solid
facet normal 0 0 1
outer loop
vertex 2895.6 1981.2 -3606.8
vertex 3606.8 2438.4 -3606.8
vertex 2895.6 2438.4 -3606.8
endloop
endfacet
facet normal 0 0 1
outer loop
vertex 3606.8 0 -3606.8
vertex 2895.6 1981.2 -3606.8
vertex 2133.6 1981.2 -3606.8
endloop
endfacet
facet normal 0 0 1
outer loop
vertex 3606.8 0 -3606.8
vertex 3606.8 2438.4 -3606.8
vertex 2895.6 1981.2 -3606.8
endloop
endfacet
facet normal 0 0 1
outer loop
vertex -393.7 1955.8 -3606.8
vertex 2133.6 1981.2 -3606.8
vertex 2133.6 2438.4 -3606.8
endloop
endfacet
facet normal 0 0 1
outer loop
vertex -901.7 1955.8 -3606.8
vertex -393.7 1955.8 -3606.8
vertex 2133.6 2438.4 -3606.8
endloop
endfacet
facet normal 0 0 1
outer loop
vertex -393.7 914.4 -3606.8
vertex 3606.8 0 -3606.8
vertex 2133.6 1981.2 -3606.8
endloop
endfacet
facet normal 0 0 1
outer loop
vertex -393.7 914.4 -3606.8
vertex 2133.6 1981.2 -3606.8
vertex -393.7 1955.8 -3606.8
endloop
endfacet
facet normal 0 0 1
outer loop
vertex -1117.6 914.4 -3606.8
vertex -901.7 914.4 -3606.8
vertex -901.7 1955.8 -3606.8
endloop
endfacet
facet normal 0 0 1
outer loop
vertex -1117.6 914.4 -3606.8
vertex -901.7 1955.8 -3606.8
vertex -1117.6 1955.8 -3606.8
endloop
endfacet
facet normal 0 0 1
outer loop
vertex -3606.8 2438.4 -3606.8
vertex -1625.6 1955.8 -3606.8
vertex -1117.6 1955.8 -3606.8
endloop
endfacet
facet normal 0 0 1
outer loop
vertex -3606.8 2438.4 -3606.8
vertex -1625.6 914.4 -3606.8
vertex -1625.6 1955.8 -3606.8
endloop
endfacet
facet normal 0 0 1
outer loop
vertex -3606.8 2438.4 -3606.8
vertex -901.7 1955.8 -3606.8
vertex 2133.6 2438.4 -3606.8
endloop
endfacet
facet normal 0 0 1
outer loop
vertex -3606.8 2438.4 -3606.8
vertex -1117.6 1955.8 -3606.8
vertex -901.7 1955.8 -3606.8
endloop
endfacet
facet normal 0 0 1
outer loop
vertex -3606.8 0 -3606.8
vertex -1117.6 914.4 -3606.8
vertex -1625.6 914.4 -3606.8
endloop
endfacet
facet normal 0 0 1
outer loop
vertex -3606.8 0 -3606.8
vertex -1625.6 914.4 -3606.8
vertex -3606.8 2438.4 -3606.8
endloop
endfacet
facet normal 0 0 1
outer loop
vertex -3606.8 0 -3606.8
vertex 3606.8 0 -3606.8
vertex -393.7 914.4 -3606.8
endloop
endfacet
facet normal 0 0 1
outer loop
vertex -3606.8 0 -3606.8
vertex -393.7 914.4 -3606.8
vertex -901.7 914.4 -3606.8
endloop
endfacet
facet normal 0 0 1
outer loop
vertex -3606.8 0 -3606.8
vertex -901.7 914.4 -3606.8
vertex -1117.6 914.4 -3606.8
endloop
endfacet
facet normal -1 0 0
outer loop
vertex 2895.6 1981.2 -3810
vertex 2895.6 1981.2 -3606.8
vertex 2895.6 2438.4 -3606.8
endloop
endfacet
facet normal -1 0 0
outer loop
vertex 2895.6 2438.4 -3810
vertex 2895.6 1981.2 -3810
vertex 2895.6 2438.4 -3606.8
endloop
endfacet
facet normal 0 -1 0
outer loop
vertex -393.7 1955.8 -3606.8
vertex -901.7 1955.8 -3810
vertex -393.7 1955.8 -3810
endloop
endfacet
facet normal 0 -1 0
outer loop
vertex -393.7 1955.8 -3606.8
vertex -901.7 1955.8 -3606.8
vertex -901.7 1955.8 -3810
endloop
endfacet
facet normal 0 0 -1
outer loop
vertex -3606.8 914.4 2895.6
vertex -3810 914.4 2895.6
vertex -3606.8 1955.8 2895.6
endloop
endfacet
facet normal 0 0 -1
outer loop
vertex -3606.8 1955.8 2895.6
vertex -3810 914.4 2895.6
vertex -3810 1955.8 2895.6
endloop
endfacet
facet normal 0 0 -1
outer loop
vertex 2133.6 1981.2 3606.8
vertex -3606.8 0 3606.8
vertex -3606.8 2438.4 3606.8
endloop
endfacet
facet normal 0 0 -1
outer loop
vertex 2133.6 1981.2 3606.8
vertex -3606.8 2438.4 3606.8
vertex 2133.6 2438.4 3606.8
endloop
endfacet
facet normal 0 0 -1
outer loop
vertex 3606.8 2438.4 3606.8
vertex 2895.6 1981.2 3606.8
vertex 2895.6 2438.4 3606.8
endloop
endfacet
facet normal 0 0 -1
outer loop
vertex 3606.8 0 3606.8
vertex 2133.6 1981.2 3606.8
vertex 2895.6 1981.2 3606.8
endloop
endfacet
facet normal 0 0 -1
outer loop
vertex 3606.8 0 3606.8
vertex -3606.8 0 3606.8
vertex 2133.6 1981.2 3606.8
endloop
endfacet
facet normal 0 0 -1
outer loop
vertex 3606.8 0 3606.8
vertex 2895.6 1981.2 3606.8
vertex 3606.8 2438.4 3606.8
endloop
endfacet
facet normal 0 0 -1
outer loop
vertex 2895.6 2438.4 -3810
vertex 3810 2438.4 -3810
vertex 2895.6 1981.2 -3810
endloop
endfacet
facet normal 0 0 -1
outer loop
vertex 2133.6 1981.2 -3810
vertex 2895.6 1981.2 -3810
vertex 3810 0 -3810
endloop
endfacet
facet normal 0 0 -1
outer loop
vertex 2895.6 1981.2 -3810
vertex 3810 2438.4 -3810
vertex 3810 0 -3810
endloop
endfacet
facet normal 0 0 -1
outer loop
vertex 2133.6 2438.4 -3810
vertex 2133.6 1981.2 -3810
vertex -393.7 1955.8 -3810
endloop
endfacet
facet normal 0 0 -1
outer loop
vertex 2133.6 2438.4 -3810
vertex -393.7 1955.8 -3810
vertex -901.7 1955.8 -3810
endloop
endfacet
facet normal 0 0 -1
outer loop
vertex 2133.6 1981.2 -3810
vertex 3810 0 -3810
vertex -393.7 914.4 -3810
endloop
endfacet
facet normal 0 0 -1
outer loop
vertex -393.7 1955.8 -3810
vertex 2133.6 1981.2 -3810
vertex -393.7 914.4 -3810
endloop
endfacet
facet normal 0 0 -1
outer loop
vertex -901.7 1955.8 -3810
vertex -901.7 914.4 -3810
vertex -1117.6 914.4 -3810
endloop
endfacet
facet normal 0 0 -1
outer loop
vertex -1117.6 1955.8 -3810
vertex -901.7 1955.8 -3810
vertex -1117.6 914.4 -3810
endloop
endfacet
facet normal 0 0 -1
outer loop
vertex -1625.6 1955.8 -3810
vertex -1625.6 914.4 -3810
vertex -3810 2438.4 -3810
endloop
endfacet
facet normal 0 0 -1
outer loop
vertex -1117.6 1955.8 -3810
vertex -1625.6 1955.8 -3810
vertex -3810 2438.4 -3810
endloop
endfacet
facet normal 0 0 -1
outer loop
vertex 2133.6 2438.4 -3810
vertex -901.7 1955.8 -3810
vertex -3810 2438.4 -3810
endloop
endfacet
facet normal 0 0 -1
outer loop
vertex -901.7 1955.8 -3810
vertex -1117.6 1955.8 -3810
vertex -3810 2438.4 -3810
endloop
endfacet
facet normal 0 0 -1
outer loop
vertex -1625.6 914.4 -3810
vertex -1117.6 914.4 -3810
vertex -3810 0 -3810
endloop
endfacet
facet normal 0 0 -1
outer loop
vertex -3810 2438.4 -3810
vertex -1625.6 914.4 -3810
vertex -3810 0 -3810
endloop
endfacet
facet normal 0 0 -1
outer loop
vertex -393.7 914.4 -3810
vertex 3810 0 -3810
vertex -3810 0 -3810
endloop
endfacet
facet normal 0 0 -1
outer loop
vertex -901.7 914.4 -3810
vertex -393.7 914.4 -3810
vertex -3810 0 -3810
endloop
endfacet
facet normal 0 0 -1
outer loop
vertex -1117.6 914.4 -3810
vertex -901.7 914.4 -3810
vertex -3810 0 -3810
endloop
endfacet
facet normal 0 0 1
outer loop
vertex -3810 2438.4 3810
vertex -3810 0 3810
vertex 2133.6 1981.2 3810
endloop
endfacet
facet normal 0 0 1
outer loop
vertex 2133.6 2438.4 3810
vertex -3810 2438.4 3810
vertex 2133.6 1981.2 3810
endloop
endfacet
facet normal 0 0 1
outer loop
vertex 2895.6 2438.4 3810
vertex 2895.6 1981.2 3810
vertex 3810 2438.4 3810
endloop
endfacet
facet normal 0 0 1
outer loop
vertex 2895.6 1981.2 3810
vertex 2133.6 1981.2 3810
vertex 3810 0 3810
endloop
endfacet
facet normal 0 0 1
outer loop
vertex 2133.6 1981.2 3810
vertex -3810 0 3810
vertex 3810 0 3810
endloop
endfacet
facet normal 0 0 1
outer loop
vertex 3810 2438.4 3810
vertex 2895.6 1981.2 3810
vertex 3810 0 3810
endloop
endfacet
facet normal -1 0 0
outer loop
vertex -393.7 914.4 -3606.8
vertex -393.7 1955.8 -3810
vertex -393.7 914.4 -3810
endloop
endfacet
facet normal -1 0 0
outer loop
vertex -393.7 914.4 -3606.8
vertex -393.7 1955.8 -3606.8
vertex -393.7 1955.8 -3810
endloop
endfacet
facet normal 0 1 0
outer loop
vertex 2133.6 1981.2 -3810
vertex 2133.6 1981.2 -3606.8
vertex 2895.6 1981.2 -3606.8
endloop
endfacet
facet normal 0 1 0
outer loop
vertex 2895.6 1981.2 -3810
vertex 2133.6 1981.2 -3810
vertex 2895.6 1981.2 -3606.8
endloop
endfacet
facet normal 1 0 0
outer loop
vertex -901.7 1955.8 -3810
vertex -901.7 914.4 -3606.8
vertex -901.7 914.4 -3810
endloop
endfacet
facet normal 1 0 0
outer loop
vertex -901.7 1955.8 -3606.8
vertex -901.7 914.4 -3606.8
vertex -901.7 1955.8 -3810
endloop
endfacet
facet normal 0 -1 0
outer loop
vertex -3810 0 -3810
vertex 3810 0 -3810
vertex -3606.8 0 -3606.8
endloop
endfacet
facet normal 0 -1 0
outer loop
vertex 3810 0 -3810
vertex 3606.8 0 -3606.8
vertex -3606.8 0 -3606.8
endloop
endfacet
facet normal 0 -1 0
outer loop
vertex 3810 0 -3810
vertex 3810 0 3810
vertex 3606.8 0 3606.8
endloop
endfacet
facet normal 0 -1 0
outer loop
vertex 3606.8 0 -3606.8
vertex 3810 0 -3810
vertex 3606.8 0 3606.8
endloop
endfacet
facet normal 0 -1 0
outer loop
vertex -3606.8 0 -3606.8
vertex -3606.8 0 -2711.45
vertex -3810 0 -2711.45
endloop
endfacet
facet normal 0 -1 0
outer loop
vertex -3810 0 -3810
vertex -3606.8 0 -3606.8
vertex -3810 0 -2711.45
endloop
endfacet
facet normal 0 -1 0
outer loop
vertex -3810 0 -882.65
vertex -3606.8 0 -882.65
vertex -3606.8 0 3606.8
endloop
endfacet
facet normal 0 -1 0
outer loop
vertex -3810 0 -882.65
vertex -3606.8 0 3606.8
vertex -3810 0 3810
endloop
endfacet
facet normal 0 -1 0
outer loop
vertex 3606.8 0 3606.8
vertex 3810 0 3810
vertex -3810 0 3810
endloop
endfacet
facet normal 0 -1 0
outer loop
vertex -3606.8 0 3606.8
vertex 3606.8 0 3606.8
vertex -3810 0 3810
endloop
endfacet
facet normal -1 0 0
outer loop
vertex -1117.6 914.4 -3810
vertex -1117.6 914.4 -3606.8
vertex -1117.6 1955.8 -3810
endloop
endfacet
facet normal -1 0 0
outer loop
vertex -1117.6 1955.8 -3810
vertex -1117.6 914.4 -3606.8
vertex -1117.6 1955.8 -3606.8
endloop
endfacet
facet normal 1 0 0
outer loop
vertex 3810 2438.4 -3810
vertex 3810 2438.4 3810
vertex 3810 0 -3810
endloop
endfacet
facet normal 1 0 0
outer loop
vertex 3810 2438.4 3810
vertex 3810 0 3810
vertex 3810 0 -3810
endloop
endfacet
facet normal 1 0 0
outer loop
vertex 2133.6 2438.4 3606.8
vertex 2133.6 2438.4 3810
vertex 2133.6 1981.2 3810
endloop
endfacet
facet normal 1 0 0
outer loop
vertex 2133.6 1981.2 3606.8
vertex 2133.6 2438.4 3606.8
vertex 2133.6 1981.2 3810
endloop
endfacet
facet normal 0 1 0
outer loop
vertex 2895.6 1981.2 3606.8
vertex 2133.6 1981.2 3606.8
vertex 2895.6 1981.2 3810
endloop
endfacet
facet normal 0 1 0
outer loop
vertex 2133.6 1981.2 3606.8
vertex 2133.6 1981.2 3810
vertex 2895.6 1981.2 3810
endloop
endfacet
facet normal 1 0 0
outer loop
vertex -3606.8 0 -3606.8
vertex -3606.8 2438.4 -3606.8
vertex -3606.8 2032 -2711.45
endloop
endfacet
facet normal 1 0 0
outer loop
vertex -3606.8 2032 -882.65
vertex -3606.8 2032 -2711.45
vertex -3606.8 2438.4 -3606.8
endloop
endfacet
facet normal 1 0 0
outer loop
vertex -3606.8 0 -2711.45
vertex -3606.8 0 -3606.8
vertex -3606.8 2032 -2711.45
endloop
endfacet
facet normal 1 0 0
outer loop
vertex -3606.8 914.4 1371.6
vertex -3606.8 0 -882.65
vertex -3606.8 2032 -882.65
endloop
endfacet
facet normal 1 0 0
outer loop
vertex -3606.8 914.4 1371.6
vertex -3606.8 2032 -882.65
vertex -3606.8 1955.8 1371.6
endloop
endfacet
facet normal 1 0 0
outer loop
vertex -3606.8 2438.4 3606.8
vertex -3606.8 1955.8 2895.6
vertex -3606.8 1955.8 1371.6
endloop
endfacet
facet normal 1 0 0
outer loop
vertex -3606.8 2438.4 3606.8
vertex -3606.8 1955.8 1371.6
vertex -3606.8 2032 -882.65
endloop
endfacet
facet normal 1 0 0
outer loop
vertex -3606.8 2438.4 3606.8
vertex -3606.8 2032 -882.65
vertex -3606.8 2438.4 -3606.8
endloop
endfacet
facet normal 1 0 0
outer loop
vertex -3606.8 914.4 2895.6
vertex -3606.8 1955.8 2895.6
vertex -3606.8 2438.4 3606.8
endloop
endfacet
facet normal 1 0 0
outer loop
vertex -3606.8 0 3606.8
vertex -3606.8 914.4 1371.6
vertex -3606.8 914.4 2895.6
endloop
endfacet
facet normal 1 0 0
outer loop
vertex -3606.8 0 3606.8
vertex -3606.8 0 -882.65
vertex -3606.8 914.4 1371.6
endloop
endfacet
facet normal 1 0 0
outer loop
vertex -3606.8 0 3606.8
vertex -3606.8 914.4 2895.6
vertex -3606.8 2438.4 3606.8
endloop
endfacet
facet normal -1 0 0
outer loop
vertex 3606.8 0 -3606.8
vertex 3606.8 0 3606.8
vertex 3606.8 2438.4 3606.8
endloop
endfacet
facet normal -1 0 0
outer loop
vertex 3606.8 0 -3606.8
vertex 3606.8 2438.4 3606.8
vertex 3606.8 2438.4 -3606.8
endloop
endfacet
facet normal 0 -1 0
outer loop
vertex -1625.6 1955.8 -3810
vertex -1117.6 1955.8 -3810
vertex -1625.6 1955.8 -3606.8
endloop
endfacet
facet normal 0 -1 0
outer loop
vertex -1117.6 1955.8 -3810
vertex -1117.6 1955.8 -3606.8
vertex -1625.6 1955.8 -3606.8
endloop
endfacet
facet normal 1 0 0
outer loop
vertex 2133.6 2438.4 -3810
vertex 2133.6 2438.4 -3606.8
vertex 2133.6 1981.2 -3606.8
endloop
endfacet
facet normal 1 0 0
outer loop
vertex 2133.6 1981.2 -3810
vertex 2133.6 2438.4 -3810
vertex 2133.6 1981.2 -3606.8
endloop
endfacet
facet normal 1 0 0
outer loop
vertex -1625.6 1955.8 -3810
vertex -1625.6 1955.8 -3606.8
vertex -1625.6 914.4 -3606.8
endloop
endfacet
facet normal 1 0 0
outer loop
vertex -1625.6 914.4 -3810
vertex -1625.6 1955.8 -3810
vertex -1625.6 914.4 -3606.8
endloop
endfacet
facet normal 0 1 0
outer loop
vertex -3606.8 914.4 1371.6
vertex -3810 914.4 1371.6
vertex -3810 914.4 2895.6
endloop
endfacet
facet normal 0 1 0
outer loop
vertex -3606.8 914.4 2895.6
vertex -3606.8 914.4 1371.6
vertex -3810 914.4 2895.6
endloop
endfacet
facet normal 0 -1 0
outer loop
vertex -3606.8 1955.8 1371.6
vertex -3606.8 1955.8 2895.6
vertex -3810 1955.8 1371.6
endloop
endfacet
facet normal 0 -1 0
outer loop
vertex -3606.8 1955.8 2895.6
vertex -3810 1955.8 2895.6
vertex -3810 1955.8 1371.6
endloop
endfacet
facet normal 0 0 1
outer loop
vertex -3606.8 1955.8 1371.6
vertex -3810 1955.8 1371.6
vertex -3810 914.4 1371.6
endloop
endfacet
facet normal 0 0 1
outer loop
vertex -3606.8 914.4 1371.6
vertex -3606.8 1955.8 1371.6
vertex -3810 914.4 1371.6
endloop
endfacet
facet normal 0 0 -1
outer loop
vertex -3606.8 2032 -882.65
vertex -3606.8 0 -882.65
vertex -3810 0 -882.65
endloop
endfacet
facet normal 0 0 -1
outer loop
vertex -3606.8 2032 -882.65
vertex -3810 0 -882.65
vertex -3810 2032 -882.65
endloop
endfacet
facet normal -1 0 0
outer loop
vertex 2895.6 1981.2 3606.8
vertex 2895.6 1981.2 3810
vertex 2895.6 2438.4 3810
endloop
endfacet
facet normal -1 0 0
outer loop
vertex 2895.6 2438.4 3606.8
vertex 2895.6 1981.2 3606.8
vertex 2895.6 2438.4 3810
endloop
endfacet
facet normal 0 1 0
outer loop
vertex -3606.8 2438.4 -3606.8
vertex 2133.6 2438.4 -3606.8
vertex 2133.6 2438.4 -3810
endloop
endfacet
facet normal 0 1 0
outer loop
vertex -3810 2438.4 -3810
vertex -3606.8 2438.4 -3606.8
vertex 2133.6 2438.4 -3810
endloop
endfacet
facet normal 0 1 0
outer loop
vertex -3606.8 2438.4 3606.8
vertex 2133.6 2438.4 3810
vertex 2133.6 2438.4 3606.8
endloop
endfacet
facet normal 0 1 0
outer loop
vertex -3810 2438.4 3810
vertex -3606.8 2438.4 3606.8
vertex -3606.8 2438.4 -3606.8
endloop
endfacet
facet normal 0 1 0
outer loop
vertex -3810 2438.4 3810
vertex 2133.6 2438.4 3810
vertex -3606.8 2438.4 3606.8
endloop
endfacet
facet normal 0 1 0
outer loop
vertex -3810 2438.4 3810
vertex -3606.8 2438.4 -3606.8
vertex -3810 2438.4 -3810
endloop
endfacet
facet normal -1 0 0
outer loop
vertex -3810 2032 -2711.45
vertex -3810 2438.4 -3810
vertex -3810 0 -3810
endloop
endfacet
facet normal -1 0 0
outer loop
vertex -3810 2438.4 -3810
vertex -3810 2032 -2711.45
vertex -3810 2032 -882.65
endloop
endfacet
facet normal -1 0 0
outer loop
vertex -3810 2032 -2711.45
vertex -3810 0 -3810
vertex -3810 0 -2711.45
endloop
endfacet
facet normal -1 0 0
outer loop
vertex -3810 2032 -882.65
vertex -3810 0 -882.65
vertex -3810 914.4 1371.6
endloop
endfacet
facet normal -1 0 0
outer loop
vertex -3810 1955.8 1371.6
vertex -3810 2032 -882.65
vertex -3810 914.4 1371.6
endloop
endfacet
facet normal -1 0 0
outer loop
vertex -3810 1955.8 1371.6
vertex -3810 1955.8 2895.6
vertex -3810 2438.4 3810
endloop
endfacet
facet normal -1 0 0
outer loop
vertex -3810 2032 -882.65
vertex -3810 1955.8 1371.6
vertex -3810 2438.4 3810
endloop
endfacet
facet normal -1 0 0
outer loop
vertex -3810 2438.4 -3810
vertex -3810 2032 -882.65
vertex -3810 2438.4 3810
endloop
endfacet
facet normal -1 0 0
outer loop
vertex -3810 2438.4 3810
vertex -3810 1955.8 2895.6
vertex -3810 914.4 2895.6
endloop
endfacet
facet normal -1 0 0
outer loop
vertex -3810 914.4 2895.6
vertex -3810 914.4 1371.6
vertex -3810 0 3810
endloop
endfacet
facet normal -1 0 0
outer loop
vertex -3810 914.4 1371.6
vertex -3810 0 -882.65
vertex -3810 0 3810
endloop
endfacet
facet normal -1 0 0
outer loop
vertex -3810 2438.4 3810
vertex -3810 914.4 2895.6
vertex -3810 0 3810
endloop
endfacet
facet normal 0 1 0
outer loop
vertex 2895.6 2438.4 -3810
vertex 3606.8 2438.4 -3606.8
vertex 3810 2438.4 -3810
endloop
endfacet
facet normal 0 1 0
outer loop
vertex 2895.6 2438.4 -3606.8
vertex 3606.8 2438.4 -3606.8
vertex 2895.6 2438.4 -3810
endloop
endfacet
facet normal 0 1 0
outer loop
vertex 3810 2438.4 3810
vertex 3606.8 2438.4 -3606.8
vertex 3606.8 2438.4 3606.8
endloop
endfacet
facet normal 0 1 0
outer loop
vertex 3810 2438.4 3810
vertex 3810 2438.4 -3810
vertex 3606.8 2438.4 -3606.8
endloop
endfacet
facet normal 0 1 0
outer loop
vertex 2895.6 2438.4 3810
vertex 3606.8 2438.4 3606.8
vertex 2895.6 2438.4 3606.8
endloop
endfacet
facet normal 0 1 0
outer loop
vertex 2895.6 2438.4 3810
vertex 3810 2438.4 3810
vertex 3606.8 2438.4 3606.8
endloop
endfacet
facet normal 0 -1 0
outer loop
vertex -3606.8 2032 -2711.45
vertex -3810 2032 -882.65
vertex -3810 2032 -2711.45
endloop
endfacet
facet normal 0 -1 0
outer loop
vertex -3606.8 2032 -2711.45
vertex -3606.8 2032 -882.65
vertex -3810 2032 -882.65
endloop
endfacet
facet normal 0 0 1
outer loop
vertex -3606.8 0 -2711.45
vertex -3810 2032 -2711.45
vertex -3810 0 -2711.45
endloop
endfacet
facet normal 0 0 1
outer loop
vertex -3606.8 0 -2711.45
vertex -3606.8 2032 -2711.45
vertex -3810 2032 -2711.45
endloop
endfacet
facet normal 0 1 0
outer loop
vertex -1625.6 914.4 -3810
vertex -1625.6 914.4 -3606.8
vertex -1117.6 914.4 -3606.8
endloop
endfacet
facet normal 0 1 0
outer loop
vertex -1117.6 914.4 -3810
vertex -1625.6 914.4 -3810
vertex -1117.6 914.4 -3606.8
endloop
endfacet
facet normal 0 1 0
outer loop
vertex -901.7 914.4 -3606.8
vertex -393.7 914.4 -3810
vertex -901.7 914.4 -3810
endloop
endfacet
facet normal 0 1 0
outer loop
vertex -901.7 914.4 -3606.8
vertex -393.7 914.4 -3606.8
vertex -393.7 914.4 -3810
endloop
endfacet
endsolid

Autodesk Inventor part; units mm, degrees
ref_plane "YZ Plane" through (0, 0, 0) normal (1, 0, 0) x (0, 1, 0)
ref_plane "XZ Plane" through (0, 0, 0) normal (0, 1, 0) x (-1, 0, 0)
ref_plane "XY Plane" through (0, 0, 0) normal (0, 0, 1) x (1, 0, 0)
sketch "Sketch2" plane through (0, 0, 0) normal (0, 1, 0) x (-1, 0, 0)
  line L0 (3810, 3810) -> (-3810, 3810)
  line L1 (-3810, 3810) -> (-3810, -3810)
  line L2 (-3810, -3810) -> (3810, -3810)
  line L3 (3810, -3810) -> (3810, 3810)
  line L4 (3606.8, 3606.8) -> (-3606.8, 3606.8)
  line L5 (-3606.8, 3606.8) -> (-3606.8, -3606.8)
  line L6 (-3606.8, -3606.8) -> (3606.8, -3606.8)
  line L7 (3606.8, -3606.8) -> (3606.8, 3606.8)
  line L8 (3810, 3810) -> (-3810, -3810)
  line L9 (3810, -3810) -> (-3810, 3810)
  point P0 (0, 0)
  point P1 (0, 0)
  point P2 (0, 0)
  dimension "d8" = 7620
  dimension "d9" = 203.2
  dimension "d73" = 7213.6
extrude "Extrusion2" add sketch "Sketch2" along normal blind 2438.4 contours L8 L4 L9 L0 | L3 L9 L7 L8 | L9 L5 L8 L1 | L2 L8 L6 L9
sketch "Sketch4" plane through (-3810, 0, 3810) normal (0, 0, 1) x (1, 0, 0)
  line L0 (7416.8, 2438.4) -> (203.2, 2438.4) projected
  line L1 (6705.6, 2438.4) -> (5943.6, 2438.4)
  line L2 (5943.6, 2438.4) -> (5943.6, 1981.2)
  line L3 (5943.6, 1981.2) -> (6705.6, 1981.2)
  line L4 (6705.6, 1981.2) -> (6705.6, 2438.4)
  line L5 (7620, 0) -> (7620, 2438.4) projected
  point P0 (3810, 0)
  point P1 (4622.8, 2438.4)
  dimension "d34" = 914.4
  dimension "d35" = 457.2
  dimension "d36" = 762
extrude "Extrusion4" cut sketch "Sketch4" against normal up to surface (203.2 mm away)
sketch "Sketch5" plane through (3606.8, 0, -3606.8) normal (0, 0, 1) x (1, 0, 0)
  line L0 (-4508.5, 1955.8) -> (-4000.5, 1955.8)
  line L1 (-4000.5, 1955.8) -> (-4000.5, 914.4)
  line L2 (-4000.5, 914.4) -> (-4508.5, 914.4)
  line L3 (-4508.5, 914.4) -> (-4508.5, 1955.8)
  line L4 (-7213.6, 0) -> (0, 0) projected
  point P0 (-3606.8, 0)
  point P1 (0, 2438.4)
  dimension "d40" = 1041.4
  dimension "d42" = 508
  dimension "d43" = 914.4
  dimension "d48" = 4000.5
extrude "Extrusion5" cut sketch "Sketch5" against normal up to surface (203.2 mm away)
sketch "Sketch6" plane through (-3606.8, 0, -3606.8) normal (0, 0, 1) x (1, 0, 0)
  line L0 (0, 2438.4) -> (7213.6, 2438.4) projected
  line L1 (6502.4, 2438.4) -> (5740.4, 2438.4)
  line L2 (5740.4, 2438.4) -> (5740.4, 1981.2)
  line L3 (5740.4, 1981.2) -> (6502.4, 1981.2)
  line L4 (6502.4, 1981.2) -> (6502.4, 2438.4)
  line L5 (7213.6, 0) -> (7213.6, 2438.4) projected
  point P0 (3606.8, 0)
  point P1 (7416.8, 2438.4)
  dimension "d49" = 457.2
  dimension "d50" = 762
  dimension "d52" = 914.4
extrude "Extrusion6" cut sketch "Sketch6" against normal up to surface (203.2 mm away)
sketch "Sketch7" plane through (-3606.8, 0, -3606.8) normal (0, 0, 1) x (1, 0, 0)
  line L0 (2489.2, 1955.8) -> (1981.2, 1955.8)
  line L1 (1981.2, 1955.8) -> (1981.2, 914.4)
  line L2 (1981.2, 914.4) -> (2489.2, 914.4)
  line L3 (2489.2, 914.4) -> (2489.2, 1955.8)
  line L4 (0, 0) -> (0, 2438.4) projected
  line L5 (0, 0) -> (7213.6, 0) projected
  point P0 (3606.8, 0)
  dimension "d55" = 1981.2
  dimension "d57" = 508
  dimension "d58" = 1041.4
  dimension "d59" = 914.4
extrude "Extrusion7" cut sketch "Sketch7" against normal up to surface (203.2 mm away)
sketch "Sketch8" plane through (-3606.8, 0, 3606.8) normal (1, 0, 0) x (0, 0, -1)
  line L0 (0, 0) -> (7213.6, 0) projected
  line L1 (6318.25, 0) -> (4489.45, 0)
  line L2 (4489.45, 0) -> (4489.45, 2032)
  line L3 (4489.45, 2032) -> (6318.25, 2032)
  line L4 (6318.25, 2032) -> (6318.25, 0)
  line L5 (7213.6, 0) -> (7213.6, 2438.4) projected
  point P0 (3606.8, 0)
  point P1 (4489.45, 0)
  dimension "d62" = 895.35
  dimension "d63" = 2032
  dimension "d64" = 1828.8
extrude "Extrusion8" cut sketch "Sketch8" against normal up to surface (203.2 mm away)
sketch "Sketch9" plane through (-3810, 0, 3810) normal (-1, 0, 0) x (0, 0, 1)
  line L0 (-914.4, 1955.8) -> (-2438.4, 1955.8)
  line L1 (-2438.4, 1955.8) -> (-2438.4, 914.4)
  line L2 (-2438.4, 914.4) -> (-914.4, 914.4)
  line L3 (-914.4, 914.4) -> (-914.4, 1955.8)
  line L4 (0, 0) -> (0, 2438.4) projected
  line L5 (-4692.65, 0) -> (0, 0) projected
  point P0 (-3810, 0)
  dimension "d67" = 914.4
  dimension "d68" = 914.4
  dimension "d69" = 1041.4
  dimension "d70" = 1524
extrude "Extrusion9" cut sketch "Sketch9" against normal up to surface (203.2 mm away)
properties part number "Walls--Exterior--Basement"
